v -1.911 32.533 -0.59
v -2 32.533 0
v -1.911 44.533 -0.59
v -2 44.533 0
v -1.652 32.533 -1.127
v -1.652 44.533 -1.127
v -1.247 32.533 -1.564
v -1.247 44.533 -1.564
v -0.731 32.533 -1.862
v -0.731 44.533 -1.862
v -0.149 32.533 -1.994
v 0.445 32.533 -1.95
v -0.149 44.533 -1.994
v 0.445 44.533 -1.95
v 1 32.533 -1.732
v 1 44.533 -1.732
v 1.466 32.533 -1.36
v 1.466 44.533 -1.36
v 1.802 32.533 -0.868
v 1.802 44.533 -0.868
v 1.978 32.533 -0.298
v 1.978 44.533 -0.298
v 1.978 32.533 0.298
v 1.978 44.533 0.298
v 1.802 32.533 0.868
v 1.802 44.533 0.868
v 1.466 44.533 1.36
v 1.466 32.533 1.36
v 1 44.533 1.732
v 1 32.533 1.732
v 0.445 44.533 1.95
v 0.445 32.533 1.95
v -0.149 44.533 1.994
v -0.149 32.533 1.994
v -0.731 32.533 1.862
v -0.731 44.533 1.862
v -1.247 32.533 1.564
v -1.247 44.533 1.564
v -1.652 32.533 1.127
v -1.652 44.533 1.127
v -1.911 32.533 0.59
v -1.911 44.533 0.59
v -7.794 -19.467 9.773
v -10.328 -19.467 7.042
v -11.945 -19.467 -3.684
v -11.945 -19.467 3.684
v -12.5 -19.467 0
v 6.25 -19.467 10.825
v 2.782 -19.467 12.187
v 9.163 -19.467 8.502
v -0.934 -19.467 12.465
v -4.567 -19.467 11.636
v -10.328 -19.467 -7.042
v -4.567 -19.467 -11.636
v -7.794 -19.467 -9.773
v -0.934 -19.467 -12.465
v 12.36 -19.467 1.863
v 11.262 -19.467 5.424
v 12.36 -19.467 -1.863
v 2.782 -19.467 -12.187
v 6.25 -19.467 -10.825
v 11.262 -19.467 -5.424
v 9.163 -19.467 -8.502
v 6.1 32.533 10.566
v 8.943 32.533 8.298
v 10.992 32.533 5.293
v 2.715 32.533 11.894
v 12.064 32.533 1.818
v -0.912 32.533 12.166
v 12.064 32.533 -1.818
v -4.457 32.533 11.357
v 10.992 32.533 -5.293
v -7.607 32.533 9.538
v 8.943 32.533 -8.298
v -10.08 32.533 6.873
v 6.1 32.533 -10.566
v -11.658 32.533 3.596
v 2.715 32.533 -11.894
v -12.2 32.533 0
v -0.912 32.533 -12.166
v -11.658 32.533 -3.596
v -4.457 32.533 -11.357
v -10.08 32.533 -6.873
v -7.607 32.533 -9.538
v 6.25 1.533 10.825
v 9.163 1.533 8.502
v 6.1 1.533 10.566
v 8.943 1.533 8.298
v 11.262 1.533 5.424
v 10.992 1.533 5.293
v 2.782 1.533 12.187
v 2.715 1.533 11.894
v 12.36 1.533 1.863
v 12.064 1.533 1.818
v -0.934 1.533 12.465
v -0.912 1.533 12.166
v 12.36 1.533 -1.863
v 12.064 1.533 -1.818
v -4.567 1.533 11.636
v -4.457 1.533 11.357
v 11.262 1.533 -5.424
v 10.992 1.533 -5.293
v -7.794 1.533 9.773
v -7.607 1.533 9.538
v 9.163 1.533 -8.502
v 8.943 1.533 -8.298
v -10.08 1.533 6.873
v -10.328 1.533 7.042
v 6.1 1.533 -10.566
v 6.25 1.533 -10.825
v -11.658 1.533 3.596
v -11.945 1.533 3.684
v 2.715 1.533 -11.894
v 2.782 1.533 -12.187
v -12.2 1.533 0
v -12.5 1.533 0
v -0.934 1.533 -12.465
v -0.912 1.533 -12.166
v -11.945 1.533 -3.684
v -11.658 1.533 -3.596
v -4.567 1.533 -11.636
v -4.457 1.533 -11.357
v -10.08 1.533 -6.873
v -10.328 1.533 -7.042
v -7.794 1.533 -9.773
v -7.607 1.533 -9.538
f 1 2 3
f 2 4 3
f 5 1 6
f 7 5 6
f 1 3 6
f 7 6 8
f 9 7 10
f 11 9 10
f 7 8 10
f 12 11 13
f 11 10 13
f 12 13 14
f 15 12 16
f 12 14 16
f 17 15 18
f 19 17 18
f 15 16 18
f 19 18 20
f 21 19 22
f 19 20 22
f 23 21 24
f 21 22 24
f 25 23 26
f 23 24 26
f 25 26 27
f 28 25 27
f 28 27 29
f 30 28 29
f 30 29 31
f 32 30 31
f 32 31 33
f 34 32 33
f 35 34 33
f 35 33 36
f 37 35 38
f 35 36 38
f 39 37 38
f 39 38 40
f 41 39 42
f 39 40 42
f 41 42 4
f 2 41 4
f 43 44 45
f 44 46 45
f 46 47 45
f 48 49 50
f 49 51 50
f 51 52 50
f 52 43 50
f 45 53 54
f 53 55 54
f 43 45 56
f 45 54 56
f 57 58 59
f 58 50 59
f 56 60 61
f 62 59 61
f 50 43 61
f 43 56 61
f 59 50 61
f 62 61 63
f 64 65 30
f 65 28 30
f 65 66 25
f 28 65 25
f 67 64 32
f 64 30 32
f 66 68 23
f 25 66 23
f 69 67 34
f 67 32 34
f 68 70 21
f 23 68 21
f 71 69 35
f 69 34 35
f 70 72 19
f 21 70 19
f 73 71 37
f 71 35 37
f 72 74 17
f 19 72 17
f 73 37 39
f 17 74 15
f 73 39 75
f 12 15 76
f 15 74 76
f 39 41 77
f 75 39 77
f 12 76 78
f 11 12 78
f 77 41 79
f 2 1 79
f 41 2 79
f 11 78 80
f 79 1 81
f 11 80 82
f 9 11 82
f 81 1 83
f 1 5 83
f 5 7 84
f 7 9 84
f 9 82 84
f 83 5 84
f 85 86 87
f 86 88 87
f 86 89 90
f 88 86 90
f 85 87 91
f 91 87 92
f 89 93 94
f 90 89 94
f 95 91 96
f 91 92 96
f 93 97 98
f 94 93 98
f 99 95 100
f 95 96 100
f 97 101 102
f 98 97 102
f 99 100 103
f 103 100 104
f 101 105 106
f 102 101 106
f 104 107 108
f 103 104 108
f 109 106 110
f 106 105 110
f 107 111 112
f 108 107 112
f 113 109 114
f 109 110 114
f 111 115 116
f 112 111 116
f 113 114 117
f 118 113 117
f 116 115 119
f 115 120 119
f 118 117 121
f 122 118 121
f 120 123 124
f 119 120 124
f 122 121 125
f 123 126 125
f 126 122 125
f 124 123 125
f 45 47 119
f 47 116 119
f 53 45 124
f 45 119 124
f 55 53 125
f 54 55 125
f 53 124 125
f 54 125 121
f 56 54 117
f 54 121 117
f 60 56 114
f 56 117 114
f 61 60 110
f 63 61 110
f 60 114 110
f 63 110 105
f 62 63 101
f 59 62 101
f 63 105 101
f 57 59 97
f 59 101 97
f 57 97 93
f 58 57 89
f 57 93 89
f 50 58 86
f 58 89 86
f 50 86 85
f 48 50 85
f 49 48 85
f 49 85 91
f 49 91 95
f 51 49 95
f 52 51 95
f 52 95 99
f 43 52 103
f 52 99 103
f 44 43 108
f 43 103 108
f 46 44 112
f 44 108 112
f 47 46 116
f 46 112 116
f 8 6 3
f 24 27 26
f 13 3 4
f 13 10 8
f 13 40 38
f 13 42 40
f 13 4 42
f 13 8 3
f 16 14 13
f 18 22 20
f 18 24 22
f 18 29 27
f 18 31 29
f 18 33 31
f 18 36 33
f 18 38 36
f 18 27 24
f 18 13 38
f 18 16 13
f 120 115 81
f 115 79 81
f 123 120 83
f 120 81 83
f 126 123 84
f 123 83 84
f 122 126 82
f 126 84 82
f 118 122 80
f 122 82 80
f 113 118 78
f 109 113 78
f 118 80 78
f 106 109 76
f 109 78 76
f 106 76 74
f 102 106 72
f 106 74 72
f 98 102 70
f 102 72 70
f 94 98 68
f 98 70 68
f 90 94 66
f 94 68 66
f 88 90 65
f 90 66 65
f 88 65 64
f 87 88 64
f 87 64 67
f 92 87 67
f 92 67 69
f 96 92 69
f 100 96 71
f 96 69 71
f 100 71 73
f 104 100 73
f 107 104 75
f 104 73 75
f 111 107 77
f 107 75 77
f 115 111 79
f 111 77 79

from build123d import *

# Parameters (mm, degrees)
ESQUISSE2_W = 2
ESQUISSE2_H = 12


with BuildPart() as part:
    # Esquisse2 → Révolution2 (revolve)
    with BuildSketch(Plane.XY, mode=Mode.PRIVATE) as r_volution2_sk:
        Polygon((2, 32.533333333), (0, 32.533333333), (0, 1.533333333), (12.2, 1.533333333), (12.2, 32.533333333), align=None)
        with Locations((1, 38.533333333)):
            Rectangle(ESQUISSE2_W, ESQUISSE2_H)
        Polygon((12.2, 1.533333333), (0, 1.533333333), (0, -19.466666667), (12.5, -19.466666667), (12.5, 1.533333333), align=None)
    revolve(r_volution2_sk.sketch.rotate(Axis((0, 32.533333333, 0), (0, -1, 0)), 180), axis=Axis((0, 32.533333333, 0), (0, -1, 0)))


solid = part.part
